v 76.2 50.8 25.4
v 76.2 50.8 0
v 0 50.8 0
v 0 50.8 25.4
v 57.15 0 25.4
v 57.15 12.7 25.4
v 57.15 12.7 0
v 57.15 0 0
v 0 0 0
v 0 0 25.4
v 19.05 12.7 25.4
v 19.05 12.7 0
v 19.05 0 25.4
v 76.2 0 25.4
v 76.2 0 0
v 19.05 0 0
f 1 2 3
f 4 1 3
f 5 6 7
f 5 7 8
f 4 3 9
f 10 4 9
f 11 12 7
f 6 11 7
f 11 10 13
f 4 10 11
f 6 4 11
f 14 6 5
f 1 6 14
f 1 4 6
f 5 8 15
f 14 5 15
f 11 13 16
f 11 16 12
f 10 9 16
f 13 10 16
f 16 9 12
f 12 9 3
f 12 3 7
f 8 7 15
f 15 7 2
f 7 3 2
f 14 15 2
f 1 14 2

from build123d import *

# Parameters (mm, degrees)
F0_W     = 25.4
F0_H     = 12.7
F1_DEPTH = 25.4


with BuildPart() as f1:
    # F0 (on Top) → F1 (new body)
    with BuildSketch(Plane.XY):
        Polygon((38.1, 38.1), (0, 0), (19.05, 0), (19.05, 12.7), (57.15, 12.7), (57.15, 0), (76.2, 0), align=None)
        Polygon((0, 38.1), (0, 0), (38.1, 38.1), (25.4, 38.1), align=None)
        with Locations((12.7, 44.45)):
            Rectangle(F0_W, F0_H)
        Polygon((25.4, 38.1), (38.1, 38.1), (50.8, 38.1), (50.8, 50.8), (25.4, 50.8), align=None)
        Polygon((50.8, 38.1), (38.1, 38.1), (76.2, 0), (76.2, 38.1), align=None)
        with Locations((63.5, 44.45)):
            Rectangle(F0_W, F0_H)
    extrude(amount=F1_DEPTH)


solid = f1.part
